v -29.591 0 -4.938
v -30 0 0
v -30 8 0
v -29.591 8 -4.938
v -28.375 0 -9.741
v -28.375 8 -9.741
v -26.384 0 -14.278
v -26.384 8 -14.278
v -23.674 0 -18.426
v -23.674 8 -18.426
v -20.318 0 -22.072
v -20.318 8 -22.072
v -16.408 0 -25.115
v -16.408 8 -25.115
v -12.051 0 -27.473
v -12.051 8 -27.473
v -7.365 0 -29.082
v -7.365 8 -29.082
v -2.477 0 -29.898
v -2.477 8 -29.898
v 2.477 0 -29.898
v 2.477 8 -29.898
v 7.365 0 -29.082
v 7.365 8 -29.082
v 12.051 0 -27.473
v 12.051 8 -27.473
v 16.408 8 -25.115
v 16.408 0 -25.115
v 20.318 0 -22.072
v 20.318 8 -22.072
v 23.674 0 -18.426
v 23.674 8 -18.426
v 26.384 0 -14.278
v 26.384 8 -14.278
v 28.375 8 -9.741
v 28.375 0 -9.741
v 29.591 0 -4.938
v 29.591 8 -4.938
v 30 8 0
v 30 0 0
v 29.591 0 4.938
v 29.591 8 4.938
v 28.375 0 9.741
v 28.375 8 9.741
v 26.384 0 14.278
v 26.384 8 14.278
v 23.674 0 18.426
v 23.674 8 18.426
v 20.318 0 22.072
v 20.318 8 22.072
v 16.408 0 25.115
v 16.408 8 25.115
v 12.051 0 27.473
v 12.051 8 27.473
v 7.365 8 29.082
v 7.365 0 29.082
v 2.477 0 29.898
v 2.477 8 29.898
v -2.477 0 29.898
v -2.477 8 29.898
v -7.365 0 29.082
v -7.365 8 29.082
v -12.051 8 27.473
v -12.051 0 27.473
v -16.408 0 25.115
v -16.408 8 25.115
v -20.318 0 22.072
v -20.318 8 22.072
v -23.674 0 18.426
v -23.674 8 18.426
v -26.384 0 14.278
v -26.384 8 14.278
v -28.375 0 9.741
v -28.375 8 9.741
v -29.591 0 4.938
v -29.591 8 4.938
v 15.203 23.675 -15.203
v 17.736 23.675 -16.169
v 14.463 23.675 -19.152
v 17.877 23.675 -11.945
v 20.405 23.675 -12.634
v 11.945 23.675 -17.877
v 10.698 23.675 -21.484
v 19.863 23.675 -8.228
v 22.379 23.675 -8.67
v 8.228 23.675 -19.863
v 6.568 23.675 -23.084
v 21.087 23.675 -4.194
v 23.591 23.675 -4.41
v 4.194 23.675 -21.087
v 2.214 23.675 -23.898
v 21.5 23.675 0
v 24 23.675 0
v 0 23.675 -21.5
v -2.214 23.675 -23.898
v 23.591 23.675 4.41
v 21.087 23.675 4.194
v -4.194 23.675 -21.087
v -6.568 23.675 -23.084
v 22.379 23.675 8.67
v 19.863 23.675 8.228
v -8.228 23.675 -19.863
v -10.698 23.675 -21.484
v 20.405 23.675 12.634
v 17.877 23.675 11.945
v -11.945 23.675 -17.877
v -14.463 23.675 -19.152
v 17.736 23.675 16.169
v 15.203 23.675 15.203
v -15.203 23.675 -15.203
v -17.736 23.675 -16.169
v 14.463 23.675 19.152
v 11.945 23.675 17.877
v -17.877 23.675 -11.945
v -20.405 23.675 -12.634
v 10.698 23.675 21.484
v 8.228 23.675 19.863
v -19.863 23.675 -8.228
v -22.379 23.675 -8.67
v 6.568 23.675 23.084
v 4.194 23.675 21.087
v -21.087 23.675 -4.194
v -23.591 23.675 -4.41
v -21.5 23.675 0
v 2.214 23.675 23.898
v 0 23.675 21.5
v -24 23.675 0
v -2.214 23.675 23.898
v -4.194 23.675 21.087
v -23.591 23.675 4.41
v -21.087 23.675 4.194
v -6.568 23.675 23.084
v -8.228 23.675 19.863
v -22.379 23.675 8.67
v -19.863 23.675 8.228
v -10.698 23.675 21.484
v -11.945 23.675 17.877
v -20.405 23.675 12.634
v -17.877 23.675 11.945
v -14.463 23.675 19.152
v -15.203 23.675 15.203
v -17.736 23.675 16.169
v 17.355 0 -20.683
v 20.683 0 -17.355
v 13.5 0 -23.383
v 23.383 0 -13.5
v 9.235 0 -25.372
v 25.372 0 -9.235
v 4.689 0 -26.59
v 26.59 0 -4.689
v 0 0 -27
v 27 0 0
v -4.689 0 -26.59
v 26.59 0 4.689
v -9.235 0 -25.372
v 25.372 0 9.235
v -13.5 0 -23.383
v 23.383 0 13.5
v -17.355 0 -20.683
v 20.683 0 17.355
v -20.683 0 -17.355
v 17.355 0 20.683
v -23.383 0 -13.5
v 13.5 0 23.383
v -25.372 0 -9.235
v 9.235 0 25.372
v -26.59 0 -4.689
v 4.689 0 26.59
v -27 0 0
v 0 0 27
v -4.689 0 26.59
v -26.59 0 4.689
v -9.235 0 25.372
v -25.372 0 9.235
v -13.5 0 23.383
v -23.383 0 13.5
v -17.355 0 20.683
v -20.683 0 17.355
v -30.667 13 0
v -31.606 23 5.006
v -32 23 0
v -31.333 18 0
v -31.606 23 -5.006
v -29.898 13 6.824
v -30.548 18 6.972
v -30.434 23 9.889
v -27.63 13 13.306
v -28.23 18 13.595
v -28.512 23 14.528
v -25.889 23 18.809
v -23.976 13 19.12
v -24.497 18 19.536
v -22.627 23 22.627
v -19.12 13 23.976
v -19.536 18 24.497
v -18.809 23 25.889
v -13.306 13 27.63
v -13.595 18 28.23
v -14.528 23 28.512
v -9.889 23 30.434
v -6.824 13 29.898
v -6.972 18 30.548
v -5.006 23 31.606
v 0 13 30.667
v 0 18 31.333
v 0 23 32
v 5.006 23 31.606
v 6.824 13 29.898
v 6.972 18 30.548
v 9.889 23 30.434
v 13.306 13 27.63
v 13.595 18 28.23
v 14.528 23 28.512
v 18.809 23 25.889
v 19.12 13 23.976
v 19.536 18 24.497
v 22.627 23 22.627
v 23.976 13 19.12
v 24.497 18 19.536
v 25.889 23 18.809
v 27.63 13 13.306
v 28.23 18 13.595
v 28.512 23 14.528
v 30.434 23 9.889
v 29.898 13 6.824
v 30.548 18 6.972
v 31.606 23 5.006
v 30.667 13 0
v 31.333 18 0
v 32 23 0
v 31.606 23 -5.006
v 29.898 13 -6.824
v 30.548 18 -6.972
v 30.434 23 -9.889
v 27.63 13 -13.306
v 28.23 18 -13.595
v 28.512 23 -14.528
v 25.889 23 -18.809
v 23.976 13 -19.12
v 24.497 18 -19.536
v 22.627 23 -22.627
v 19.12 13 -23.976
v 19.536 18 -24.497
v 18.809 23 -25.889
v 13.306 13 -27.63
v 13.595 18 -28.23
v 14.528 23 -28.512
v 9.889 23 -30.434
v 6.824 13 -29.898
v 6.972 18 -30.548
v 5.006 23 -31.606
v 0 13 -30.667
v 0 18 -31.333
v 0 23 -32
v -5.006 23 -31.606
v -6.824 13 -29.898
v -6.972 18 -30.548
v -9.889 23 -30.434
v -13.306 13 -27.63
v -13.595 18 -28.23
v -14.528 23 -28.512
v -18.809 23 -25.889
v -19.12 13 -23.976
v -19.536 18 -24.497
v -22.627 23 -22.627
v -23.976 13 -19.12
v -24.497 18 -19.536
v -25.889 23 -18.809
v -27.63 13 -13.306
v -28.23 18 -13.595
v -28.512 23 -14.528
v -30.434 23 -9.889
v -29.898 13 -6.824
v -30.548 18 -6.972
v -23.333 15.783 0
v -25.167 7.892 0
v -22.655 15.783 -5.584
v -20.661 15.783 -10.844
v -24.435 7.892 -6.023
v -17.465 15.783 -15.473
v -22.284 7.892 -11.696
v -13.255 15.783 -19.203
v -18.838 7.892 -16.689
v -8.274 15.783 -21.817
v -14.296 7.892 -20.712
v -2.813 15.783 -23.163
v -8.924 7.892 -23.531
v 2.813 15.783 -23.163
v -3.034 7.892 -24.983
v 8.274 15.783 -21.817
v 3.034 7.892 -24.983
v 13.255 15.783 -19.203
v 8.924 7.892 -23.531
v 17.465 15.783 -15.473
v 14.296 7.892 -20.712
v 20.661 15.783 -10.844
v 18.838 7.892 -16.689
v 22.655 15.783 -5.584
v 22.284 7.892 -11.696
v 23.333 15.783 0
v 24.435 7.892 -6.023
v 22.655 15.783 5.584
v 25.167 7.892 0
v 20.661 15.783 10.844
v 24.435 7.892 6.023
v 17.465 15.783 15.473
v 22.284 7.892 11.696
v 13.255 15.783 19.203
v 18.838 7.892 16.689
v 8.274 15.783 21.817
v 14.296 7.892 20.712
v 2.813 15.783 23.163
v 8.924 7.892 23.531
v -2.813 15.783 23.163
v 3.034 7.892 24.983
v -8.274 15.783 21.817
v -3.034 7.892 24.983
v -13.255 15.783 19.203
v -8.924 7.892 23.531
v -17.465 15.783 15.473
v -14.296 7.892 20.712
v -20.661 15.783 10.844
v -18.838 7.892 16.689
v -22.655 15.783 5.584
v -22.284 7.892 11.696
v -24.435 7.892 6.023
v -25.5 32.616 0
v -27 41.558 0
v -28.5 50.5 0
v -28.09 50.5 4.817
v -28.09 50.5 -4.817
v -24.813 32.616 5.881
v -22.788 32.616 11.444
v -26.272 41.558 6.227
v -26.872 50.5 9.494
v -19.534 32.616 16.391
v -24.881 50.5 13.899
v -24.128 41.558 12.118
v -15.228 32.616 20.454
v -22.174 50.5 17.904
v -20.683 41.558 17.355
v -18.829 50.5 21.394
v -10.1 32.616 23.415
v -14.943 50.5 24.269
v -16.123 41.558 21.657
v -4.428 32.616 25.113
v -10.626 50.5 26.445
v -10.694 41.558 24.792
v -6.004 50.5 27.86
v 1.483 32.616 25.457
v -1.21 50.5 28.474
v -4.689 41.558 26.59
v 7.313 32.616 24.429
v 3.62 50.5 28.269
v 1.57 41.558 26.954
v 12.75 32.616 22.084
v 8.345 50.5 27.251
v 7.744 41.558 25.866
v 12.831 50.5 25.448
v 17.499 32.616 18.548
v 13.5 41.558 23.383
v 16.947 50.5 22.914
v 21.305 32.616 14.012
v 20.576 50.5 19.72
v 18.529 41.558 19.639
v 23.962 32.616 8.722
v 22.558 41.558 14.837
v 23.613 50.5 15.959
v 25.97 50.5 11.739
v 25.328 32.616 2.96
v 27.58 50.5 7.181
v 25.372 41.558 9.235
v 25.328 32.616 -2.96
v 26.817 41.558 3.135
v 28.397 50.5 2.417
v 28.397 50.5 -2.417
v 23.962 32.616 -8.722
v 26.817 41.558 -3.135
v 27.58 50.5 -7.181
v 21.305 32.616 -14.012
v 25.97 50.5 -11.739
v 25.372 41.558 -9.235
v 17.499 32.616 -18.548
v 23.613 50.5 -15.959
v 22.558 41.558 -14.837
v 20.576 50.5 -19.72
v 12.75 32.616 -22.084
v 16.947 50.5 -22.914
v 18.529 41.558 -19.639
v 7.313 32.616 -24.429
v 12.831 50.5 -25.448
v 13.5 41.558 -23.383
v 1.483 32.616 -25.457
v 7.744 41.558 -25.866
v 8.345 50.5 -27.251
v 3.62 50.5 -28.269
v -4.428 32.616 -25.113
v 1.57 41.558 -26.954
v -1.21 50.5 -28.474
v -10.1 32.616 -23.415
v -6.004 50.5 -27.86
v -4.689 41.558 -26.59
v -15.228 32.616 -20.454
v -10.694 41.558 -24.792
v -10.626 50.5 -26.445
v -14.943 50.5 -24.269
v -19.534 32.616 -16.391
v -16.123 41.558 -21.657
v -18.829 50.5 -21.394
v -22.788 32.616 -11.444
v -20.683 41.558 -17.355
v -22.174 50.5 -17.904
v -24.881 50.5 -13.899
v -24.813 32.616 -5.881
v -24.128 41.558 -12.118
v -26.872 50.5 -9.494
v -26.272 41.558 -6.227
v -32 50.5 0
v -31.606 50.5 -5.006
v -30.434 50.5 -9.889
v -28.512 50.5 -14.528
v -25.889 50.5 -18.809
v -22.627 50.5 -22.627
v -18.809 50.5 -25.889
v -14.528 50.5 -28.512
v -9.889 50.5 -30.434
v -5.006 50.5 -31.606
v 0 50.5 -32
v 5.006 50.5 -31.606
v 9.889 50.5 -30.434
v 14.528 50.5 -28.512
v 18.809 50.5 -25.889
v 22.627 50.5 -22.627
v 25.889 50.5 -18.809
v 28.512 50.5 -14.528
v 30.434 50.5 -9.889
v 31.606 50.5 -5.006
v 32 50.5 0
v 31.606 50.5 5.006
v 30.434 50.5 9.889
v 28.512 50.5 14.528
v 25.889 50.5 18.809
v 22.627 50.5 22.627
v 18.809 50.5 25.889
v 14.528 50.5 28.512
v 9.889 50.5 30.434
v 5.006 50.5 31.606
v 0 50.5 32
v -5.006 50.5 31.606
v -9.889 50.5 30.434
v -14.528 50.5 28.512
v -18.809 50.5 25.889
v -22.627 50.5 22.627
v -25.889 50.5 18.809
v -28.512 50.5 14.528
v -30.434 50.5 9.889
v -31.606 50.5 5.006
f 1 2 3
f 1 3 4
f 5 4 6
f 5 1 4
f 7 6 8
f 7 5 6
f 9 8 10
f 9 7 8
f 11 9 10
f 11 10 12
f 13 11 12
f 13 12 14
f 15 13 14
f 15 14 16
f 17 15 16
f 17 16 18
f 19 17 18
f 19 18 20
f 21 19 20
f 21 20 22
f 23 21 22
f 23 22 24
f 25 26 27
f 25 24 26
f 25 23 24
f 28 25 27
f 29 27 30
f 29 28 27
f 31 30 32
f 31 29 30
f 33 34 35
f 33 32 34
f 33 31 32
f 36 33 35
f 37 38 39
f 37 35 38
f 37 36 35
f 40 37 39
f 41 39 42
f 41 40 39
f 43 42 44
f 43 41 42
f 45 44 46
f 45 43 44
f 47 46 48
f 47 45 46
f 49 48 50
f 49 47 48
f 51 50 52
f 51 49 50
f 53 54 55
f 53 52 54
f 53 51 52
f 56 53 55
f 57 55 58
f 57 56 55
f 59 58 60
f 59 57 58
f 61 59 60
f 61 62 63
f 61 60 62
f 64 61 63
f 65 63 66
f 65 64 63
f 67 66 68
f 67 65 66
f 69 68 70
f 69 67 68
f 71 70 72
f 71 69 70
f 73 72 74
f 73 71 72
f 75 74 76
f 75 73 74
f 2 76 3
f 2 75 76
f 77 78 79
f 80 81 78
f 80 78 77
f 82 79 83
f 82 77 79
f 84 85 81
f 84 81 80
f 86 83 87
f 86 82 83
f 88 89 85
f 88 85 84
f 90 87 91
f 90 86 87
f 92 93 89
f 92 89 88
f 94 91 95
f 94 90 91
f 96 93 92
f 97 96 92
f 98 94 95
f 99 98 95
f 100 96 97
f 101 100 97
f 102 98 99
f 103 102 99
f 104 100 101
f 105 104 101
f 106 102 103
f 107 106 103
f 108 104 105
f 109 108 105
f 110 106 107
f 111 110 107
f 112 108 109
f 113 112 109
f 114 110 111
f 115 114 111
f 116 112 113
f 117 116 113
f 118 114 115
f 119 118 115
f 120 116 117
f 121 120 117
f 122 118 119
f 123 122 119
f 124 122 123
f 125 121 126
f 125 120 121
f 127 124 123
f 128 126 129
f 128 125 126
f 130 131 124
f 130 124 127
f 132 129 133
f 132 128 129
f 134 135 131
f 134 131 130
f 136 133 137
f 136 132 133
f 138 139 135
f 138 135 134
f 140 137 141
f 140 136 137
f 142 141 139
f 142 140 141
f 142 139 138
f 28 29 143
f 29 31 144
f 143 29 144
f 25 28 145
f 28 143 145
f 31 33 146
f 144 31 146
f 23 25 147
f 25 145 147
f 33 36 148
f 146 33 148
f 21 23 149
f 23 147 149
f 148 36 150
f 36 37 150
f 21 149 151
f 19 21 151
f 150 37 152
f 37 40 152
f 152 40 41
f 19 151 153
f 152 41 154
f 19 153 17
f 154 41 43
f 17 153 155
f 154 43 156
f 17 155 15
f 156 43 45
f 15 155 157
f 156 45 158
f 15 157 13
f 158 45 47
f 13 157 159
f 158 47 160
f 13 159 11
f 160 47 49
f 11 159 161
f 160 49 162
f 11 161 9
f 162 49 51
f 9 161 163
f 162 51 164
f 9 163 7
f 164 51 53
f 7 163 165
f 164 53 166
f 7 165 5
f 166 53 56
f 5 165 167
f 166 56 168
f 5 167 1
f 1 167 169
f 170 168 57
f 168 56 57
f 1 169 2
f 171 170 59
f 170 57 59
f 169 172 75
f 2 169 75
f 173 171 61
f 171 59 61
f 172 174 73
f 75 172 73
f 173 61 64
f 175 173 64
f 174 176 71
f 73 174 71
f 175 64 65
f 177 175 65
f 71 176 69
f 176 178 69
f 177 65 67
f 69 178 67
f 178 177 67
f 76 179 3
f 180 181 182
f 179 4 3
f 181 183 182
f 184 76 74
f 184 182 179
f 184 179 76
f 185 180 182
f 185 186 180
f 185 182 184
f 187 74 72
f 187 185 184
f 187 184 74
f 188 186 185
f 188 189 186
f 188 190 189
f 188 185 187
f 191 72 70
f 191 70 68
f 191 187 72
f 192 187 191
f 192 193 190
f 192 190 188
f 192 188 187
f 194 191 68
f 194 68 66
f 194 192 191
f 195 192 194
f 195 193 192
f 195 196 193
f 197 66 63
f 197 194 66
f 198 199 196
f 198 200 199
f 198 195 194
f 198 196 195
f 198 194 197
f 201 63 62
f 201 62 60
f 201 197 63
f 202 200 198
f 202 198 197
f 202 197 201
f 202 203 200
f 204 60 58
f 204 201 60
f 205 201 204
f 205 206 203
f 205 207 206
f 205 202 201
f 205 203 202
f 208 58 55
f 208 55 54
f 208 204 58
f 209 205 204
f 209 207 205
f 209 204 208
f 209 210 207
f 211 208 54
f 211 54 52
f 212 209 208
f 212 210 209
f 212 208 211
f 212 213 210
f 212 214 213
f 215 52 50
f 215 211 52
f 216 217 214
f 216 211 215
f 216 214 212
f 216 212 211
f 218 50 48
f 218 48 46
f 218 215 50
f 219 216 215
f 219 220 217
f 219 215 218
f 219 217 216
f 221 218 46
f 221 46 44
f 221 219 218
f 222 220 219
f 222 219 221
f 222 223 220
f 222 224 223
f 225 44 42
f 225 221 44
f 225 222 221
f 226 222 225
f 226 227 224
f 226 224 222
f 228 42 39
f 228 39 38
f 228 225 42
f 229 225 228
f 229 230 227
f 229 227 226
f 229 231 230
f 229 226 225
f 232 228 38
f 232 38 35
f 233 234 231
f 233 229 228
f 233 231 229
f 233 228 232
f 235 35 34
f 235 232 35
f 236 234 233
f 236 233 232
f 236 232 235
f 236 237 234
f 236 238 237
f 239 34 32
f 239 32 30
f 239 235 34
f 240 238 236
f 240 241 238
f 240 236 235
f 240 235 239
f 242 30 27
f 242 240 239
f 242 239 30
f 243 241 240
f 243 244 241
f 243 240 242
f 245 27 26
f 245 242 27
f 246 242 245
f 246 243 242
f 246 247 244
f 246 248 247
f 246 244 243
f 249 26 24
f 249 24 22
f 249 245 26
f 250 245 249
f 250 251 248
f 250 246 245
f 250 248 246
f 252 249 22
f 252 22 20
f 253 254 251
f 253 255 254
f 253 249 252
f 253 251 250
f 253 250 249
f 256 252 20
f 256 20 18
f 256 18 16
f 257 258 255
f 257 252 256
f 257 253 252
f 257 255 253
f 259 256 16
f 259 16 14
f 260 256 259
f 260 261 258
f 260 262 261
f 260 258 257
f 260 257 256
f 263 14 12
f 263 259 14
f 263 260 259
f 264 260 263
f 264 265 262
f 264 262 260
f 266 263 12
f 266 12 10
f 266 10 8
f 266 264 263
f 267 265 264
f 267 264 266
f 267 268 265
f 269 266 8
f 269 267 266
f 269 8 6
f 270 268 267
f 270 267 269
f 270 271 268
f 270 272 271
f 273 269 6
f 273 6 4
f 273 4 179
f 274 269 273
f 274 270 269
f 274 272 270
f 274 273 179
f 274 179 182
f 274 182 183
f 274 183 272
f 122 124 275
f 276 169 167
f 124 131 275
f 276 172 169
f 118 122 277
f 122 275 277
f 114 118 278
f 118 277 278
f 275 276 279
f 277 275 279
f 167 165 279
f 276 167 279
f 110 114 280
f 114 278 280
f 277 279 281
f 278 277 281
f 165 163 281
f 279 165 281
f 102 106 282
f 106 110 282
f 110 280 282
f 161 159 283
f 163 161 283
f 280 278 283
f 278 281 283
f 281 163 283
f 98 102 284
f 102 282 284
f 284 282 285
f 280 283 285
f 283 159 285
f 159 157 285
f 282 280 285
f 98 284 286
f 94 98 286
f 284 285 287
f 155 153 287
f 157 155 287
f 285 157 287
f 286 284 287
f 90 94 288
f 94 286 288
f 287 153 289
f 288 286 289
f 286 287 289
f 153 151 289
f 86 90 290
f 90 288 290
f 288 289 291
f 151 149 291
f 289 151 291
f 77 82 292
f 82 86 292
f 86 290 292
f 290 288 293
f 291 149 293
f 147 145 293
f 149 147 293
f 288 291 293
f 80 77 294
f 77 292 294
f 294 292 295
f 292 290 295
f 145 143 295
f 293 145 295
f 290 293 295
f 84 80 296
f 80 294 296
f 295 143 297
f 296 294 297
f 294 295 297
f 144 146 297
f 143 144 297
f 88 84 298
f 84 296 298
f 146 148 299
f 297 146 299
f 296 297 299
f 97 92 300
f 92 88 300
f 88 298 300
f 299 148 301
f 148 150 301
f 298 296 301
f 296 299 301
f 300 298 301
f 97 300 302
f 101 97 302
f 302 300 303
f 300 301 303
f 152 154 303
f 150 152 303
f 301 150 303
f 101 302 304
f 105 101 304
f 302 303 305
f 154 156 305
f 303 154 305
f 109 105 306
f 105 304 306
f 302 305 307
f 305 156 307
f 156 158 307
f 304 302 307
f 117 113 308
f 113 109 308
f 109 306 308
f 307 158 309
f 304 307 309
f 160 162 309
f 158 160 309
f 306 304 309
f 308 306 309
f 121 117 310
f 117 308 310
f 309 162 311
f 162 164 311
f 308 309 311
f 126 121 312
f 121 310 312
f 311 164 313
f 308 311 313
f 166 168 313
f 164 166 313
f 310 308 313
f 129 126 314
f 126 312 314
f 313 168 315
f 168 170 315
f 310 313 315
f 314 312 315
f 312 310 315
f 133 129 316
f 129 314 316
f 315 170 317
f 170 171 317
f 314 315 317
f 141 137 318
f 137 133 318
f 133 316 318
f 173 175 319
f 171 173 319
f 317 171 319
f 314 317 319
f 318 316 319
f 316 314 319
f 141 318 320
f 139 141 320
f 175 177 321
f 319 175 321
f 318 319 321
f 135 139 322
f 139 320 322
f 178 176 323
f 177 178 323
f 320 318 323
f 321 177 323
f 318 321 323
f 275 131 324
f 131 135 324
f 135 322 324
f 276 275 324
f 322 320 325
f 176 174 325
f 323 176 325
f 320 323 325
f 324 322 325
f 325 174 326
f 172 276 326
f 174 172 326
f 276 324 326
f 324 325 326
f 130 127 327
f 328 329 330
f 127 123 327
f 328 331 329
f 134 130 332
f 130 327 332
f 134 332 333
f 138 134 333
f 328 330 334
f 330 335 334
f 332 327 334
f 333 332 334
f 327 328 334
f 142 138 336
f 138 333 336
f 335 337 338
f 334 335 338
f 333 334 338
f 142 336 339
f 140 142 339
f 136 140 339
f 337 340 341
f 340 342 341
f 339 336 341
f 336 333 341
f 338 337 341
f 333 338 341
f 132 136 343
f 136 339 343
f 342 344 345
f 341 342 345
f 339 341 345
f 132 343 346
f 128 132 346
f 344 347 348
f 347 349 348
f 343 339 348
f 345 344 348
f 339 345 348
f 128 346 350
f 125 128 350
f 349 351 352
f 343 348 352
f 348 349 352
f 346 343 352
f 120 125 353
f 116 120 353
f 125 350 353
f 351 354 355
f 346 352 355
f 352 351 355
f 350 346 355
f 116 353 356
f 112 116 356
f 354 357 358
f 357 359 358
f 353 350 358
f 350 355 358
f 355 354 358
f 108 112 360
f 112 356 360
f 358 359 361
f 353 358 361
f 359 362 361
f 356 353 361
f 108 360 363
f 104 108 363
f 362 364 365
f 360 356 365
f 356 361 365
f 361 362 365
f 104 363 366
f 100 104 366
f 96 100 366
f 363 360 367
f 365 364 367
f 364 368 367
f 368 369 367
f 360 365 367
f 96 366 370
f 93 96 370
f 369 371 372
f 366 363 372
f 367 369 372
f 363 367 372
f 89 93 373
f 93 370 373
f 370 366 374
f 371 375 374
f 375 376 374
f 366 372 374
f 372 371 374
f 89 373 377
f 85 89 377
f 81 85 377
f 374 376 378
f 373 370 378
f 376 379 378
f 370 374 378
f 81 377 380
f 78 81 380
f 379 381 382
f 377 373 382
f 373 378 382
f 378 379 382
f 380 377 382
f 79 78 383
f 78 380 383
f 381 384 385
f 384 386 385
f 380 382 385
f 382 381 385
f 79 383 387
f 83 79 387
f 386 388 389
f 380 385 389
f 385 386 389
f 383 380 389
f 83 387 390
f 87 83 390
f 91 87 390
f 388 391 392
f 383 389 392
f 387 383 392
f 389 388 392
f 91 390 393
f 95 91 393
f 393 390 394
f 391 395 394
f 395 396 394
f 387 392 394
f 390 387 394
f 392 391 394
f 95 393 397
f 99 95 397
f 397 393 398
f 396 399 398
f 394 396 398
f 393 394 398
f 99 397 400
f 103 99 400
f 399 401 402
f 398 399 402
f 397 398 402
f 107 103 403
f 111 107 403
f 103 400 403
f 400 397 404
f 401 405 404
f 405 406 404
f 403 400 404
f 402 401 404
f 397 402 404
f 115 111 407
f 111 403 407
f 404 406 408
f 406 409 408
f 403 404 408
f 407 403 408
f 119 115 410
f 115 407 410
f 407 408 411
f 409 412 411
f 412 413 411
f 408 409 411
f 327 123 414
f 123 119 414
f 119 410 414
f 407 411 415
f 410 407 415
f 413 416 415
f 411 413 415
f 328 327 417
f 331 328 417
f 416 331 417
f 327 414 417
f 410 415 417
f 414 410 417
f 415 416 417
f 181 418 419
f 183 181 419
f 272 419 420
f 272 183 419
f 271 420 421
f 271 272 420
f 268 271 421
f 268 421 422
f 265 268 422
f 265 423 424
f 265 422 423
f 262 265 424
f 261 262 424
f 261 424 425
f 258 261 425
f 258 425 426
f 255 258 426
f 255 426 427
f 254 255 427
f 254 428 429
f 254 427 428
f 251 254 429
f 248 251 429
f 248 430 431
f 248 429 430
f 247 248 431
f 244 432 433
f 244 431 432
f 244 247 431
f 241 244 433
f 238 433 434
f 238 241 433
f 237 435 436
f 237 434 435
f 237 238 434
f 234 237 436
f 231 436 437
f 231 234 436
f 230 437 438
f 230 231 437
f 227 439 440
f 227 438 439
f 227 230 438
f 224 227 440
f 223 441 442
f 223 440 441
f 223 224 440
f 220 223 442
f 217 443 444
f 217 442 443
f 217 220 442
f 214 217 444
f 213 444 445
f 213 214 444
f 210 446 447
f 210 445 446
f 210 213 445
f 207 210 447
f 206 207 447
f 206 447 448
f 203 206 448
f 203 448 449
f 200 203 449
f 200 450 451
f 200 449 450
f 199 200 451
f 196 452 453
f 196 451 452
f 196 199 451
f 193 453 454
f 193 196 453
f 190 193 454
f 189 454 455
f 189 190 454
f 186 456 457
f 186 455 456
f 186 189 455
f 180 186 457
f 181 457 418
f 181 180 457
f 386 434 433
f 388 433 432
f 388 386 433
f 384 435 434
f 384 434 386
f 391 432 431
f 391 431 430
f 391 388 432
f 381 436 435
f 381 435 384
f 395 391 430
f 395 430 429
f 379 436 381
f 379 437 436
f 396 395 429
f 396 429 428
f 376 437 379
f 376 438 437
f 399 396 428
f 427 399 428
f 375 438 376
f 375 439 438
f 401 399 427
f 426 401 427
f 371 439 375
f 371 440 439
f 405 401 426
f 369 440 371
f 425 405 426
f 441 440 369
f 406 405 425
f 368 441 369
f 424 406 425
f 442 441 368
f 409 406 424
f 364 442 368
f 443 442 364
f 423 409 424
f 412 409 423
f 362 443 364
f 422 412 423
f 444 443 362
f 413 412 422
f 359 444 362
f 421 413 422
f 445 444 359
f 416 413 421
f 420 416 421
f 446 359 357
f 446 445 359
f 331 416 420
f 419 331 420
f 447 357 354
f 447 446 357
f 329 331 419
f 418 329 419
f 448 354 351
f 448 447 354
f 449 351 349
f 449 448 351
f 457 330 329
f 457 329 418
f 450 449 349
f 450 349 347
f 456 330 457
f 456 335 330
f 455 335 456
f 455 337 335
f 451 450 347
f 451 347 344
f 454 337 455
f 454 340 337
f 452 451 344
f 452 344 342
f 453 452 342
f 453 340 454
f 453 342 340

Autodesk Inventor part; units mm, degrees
ref_plane "YZ Plane" through (0, 0, 0) normal (1, 0, 0) x (0, 1, 0)
ref_plane "XZ Plane" through (0, 0, 0) normal (0, 1, 0) x (-1, 0, 0)
ref_plane "XY Plane" through (0, 0, 0) normal (0, 0, 1) x (1, 0, 0)
sketch "Boceto1" plane through (0, 0, 0) normal (0, 0, 1) x (1, 0, 0)
  line L0 (-32, 50.5) -> (-32, 23)
  line L1 (-32, 23) -> (-30, 8)
  line L2 (-30, 8) -> (-30, 0)
  line L3 (-32, 50.5) -> (-28.5, 50.5)
  line L4 (-24, 23.6746) -> (-21.5, 23.6746)
  line L5 (-21.5, 23.6746) -> (-27, 0)
  line L6 (-27, 0) -> (-30, 0)
  line L7 (-28.5, 50.5) -> (-24, 23.6746)
  line L8 (0, -10.1) -> (0, 60.6) projected
  point P0 (0, 0)
  point P1 (0, 0)
  dimension "d2" = 2
  dimension "d3" = 8
  dimension "d4" = 15
  dimension "d14" = 3.5
  dimension "d15" = 3
  dimension "d16" = 2.5
  dimension "d17" = 4.5
revolve "Revolución1" add sketch "Boceto1" angle 360 about axis through (0, -10, 0) along (0, 1, 0)
properties part number "PARTE_INTERIOR_FENOLICO_TOBERA" material "Resina fenólica"
